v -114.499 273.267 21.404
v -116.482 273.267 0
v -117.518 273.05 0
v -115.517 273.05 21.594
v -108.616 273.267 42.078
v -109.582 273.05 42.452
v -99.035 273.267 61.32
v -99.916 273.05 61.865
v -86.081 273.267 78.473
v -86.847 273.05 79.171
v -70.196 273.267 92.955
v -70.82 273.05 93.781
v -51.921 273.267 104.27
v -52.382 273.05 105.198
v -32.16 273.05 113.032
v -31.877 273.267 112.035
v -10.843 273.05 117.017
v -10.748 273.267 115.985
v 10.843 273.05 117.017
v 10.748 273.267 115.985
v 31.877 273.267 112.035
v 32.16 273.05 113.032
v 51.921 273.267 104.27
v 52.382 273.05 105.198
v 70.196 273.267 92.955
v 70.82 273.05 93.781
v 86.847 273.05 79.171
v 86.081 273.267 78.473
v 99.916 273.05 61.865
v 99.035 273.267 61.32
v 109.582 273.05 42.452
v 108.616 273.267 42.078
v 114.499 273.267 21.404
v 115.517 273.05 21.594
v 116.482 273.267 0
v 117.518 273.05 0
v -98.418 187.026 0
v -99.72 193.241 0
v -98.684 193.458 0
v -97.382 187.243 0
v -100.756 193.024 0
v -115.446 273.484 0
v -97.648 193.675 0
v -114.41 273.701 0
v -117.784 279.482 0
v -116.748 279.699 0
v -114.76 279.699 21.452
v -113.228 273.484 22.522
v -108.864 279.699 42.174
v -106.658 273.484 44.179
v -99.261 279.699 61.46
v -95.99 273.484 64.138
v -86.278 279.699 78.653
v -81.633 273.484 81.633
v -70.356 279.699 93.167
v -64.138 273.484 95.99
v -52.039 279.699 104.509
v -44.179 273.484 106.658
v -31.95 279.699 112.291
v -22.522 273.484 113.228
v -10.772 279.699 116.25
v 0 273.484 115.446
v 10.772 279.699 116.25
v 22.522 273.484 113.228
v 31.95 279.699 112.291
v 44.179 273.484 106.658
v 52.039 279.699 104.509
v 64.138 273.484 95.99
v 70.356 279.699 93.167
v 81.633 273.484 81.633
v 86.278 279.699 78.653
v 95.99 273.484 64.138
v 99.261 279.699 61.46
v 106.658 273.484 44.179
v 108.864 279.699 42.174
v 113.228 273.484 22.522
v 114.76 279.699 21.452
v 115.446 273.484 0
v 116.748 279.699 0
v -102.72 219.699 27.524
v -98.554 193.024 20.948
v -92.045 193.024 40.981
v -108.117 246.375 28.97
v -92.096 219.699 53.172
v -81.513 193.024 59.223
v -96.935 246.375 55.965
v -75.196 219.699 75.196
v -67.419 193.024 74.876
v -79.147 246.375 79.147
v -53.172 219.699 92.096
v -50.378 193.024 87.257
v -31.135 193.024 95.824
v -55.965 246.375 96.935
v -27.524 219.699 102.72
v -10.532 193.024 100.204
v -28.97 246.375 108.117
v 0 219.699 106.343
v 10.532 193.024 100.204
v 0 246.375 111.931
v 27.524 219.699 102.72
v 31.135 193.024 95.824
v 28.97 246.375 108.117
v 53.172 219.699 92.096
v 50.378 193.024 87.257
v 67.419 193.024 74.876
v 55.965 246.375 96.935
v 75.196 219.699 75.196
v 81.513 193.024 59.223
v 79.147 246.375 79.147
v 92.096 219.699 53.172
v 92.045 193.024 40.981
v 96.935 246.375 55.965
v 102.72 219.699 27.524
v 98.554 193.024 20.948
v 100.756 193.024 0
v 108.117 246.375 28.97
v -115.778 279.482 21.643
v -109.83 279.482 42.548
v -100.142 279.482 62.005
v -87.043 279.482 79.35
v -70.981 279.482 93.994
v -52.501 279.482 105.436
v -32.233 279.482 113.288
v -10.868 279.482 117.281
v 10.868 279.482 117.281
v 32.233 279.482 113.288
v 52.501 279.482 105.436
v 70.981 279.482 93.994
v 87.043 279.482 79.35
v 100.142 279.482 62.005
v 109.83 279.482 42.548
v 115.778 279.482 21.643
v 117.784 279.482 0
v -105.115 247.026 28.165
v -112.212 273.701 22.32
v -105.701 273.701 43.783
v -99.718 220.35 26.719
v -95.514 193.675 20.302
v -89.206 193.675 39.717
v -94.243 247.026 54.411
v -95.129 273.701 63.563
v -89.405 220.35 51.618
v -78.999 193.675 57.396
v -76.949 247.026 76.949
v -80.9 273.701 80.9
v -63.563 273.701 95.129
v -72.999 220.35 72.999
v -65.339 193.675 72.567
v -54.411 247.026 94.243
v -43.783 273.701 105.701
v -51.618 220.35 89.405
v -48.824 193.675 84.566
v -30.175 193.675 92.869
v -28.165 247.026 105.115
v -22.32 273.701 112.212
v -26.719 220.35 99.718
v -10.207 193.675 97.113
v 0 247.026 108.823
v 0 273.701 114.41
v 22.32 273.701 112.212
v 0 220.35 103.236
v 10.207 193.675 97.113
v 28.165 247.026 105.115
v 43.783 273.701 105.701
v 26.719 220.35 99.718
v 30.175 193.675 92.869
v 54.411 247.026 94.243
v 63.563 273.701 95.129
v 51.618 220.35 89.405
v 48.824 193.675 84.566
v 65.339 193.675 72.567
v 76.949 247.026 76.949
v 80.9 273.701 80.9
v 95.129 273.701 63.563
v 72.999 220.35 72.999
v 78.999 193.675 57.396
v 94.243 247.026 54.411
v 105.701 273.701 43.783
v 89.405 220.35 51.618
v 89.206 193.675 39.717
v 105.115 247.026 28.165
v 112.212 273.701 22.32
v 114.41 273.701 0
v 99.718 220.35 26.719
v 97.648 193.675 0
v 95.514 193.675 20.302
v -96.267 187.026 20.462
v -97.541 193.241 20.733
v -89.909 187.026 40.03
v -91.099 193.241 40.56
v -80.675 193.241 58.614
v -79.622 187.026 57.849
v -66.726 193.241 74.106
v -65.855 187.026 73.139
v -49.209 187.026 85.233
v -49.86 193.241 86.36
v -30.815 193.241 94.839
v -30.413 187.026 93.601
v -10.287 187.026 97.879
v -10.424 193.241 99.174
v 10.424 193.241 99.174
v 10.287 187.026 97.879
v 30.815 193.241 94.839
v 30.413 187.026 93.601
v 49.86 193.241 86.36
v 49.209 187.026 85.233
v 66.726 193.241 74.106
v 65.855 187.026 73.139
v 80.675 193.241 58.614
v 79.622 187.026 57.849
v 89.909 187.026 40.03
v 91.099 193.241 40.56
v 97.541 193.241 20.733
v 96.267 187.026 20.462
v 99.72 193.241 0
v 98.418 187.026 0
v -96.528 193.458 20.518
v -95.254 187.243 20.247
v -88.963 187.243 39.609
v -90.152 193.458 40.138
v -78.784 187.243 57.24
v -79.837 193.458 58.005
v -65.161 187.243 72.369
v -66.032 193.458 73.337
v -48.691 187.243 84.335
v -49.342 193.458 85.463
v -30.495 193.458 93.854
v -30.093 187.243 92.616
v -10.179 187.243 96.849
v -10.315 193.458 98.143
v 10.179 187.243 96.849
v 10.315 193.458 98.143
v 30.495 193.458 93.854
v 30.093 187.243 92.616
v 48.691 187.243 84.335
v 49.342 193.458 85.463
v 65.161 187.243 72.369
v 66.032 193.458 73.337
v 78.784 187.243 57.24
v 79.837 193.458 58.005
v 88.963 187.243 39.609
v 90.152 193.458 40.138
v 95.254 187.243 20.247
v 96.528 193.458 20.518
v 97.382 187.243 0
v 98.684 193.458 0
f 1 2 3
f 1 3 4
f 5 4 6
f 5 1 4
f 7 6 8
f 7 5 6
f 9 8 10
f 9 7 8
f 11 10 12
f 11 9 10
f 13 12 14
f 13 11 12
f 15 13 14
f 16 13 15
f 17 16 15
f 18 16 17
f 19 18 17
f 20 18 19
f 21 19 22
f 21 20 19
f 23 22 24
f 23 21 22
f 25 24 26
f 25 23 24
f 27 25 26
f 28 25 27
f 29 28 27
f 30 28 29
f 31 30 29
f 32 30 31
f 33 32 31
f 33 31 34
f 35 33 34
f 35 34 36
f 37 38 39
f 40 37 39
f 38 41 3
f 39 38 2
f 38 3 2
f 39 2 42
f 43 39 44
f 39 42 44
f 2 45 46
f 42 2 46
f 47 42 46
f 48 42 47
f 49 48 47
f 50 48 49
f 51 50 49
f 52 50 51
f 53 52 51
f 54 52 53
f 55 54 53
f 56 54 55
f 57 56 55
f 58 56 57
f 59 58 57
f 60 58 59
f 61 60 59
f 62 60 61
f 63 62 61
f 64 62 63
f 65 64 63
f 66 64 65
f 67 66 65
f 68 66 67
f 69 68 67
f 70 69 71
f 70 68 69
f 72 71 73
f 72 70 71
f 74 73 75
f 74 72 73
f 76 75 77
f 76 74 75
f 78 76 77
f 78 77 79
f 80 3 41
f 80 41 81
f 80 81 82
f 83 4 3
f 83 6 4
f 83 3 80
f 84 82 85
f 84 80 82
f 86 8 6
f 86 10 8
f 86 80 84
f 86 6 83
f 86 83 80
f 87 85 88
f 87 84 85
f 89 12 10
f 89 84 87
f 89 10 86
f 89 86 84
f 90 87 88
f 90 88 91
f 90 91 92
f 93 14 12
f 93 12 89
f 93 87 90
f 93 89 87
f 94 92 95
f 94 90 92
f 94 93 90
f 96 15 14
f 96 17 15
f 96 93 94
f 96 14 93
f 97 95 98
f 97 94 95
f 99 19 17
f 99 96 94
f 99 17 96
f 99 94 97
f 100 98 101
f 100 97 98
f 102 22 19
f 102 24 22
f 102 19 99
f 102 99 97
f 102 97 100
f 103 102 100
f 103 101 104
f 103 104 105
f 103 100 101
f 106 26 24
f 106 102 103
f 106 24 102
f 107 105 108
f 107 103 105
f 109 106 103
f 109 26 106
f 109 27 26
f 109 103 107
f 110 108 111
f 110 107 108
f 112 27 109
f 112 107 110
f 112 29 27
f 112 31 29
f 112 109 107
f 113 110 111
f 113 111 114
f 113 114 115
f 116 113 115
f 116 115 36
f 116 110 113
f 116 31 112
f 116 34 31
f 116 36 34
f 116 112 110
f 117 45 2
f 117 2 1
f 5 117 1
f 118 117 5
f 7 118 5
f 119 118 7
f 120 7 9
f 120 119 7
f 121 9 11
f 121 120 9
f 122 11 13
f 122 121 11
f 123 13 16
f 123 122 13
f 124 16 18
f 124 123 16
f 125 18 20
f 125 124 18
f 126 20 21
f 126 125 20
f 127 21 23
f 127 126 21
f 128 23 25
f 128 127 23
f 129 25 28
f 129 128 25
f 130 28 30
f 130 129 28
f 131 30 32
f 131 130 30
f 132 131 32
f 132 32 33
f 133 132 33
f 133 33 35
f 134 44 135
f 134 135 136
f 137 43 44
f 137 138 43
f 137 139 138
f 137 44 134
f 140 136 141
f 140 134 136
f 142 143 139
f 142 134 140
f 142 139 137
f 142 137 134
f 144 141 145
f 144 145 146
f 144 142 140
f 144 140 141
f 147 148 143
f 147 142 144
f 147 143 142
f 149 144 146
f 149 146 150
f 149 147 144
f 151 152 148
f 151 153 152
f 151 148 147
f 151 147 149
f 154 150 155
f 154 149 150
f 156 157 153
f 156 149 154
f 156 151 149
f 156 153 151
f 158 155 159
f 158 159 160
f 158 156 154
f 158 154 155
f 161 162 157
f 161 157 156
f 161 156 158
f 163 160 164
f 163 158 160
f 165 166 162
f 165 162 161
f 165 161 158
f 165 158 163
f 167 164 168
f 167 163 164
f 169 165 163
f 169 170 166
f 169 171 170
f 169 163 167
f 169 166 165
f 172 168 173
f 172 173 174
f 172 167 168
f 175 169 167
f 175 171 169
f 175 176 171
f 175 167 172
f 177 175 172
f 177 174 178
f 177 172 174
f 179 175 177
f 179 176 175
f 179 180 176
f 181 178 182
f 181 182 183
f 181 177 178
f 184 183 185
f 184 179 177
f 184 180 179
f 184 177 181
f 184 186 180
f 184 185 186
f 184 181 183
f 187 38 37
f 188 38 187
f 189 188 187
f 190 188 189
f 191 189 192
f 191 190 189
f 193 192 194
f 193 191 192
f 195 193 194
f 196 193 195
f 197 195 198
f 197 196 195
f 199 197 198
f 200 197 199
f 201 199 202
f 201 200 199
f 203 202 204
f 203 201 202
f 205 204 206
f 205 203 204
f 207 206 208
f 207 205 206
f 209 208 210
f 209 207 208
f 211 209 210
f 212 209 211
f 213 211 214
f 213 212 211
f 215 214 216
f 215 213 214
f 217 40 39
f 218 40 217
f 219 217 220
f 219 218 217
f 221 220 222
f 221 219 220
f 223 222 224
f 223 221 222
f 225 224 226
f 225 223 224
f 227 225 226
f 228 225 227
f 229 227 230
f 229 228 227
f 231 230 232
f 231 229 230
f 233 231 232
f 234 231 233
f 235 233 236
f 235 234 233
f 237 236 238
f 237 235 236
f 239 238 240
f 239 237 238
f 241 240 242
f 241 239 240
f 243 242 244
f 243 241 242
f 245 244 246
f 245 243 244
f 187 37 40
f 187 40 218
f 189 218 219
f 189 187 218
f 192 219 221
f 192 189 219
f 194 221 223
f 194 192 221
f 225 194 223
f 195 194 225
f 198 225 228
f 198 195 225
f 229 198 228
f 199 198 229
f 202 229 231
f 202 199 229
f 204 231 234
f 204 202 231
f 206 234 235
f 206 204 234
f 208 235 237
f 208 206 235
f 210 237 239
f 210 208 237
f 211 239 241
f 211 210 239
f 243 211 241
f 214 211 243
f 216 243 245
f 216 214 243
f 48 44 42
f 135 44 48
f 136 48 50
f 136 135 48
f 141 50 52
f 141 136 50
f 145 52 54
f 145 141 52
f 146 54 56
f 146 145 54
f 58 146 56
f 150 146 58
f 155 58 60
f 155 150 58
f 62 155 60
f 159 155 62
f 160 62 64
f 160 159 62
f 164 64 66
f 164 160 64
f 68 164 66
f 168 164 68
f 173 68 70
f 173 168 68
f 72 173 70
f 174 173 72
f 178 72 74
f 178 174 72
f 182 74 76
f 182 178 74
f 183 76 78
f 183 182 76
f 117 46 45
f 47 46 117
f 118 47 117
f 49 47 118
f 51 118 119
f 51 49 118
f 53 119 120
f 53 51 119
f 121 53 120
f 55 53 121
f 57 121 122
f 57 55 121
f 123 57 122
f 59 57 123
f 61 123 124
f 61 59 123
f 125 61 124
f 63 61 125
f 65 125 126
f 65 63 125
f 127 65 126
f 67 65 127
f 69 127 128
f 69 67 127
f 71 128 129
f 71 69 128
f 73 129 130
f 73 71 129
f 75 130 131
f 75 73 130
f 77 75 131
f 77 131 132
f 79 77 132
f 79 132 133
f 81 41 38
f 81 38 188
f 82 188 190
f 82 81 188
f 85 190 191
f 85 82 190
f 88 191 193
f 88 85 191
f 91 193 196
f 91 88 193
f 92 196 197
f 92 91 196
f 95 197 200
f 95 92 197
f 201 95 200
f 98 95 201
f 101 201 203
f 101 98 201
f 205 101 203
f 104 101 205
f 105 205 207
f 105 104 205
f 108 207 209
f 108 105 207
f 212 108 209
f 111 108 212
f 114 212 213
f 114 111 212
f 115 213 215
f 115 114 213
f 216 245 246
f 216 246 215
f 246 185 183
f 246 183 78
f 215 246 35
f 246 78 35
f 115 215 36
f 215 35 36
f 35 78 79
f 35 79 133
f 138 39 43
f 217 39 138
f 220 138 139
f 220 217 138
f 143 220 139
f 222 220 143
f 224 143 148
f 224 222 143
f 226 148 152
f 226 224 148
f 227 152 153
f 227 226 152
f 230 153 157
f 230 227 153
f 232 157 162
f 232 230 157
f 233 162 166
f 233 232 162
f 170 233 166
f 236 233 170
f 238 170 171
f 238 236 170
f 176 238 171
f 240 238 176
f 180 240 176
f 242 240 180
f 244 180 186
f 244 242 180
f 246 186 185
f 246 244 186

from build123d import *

# Parameters (mm, degrees)
RIB5_START          = -1.5875
RIB5_DEPTH          = 3.175
CIRPATTERN1_COUNT   = 4
BOSS_EXTRUDE1_REACH = 604.818
SKETCH4_R           = 50.8
SKETCH4_R_2         = 44.45
SKETCH4_3_R         = 44.45
CUT_EXTRUDE1_DEPTH  = 155.575
SKETCH16_R          = 47.625
SKETCH16_R_2        = 44.45
CUT_EXTRUDE8_DEPTH  = 165.1
BOSS_EXTRUDE2_START = 127
SKETCH10_R          = 53.975
SKETCH10_R_2        = 50.8
BOSS_EXTRUDE2_DEPTH = 127
RIB10_START         = -3.175
RIB10_DEPTH         = 3.175
SKETCH12_R          = 50.8
CUT_EXTRUDE4_DEPTH  = 9.525
SKETCH17_R          = 3.175
CUT_EXTRUDE9_DEPTH  = 3.175
SKETCH18_W          = 50.8
SKETCH18_H          = 130.175
SKETCH19_W          = 254
SKETCH19_H          = 114.3
CUT_EXTRUDE10_DEPTH = 326.542078986


with BuildPart() as part:
    # Sketch1 → Revolve-Thin1 (revolve)
    with BuildSketch(Plane.XY, mode=Mode.PRIVATE) as revolve_thin1_sk:
        Polygon((-104.775, 0), (-60.325, 0), (-158.75, 469.9), (-50.8, 469.9), (-50.8, 466.725), (-154.841065026, 466.725), (-56.416065026, -3.175), (-104.775, -3.175), align=None)
    revolve(revolve_thin1_sk.sketch.rotate(Axis((0, 0, 0), (0, 1, 0)), 270), axis=Axis((0, 0, 0), (0, 1, 0)))

    # Rib5: read off the stored shape, not the designer's step
    # Rib5 outline → Rib5 (add)
    with BuildSketch(Plane(origin=(0, 0, 0), x_dir=(0, 0, -1), z_dir=(1, 0, 0)).offset(RIB5_START)):
        with BuildLine():
            add(Edge.make_bspline(
                [(-60.304108235, -2e-09), (-60.337817831, 0.160880416), (-60.371527408, 0.321760839), (-62.968360223, 12.715265359), (-65.531376886, 24.947911788), (-71.07360722, 51.400397829), (-74.052795216, 65.620242821), (-77.031911205, 79.840102899)],
                knots=[1388.368707512, 1388.368707512, 1388.368707512, 1388.368707512, 1388.861829823, 1388.861829823, 1426.356632629, 1426.356632629, 1469.942363945, 1469.942363945, 1469.942363945, 1469.942363945], degree=3))
            Line((-77.031911205, 79.840102899), (-98.425, 0))
            Line((-98.425, 0), (-60.304108235, -2e-09))
        make_face()
    rib5 = extrude(amount=RIB5_DEPTH)

    # CirPattern1: Rib5 ×4 about axis
    cirpattern1_axis = Axis((0, 0, 0), (0, 1, 0))
    for i in range(1, CIRPATTERN1_COUNT):
        add(rib5.rotate(cirpattern1_axis, i * 360 / CIRPATTERN1_COUNT))

    # Sketch4 → Boss-Extrude1 (add, up to next)
    with BuildSketch(Plane(origin=(0, 41.317067623, 234.320734449), x_dir=(-1, 0, 0), z_dir=(0, 0.17364817766693072, 0.984807753012208)), mode=Mode.PRIVATE) as boss_extrude1_sk1:
        with Locations(Location((-89.350924276, -380.21116314, 0), (0, 0, 90))):
            Circle(SKETCH4_R)
        with Locations(Location((-89.350924276, -380.21116314, 0), (0, 0, 90))):
            Circle(SKETCH4_R_2, mode=Mode.SUBTRACT)
    boss_extrude1_tool1 = extrude(boss_extrude1_sk1.sketch, amount=-BOSS_EXTRUDE1_REACH, mode=Mode.PRIVATE) - part.part
    add(boss_extrude1_tool1.solids().sort_by_distance((89.350924, 464.365191, 159.725936))[0])

    # Sketch4<3> → Cut-Extrude1 (cut)
    with BuildSketch(Plane(origin=(0, 41.317067623, 234.320734449), x_dir=(-1, 0, 0), z_dir=(0, 0.17364817766693072, 0.984807753012208))):
        with Locations(Location((-89.350924276, -380.21116314, 0), (0, 0, 90))):
            Circle(SKETCH4_3_R)
    extrude(amount=-CUT_EXTRUDE1_DEPTH, mode=Mode.SUBTRACT)

    # Sketch16 → Cut-Extrude8 (cut)
    # profile 1 of 2: a face of its own
    with BuildSketch(Plane(origin=(0, 41.317067623, 234.320734449), x_dir=(1, 0, 0), z_dir=(0, 0.17364817766693058, 0.9848077530122081))):
        with Locations(Location((89.350924276, 380.21116314, 0), (0, 0, 270))):
            Circle(SKETCH16_R)
        with Locations((89.350924276, 380.21116314)):
            Circle(SKETCH16_R_2, mode=Mode.SUBTRACT)
    # profile 2 of 2: a face of its own
    with BuildSketch(Plane(origin=(0, 41.317067623, 234.320734449), x_dir=(1, 0, 0), z_dir=(0, 0.17364817766693058, 0.9848077530122081))):
        with Locations((89.350924276, 380.21116314)):
            Circle(SKETCH16_R_2)
    extrude(amount=-CUT_EXTRUDE8_DEPTH, mode=Mode.SUBTRACT)

    # Sketch10 → Boss-Extrude2 (add)
    with BuildSketch(Plane.XZ.offset(-466.725).offset(BOSS_EXTRUDE2_START)):
        with Locations(Location((0, 0, 0), (0, 0, 90))):
            Circle(SKETCH10_R)
        with Locations(Location((0, 0, 0), (0, 0, 270))):
            Circle(SKETCH10_R_2, mode=Mode.SUBTRACT)
    extrude(amount=-BOSS_EXTRUDE2_DEPTH)

    # Rib10: read off the stored shape, not the designer's step
    # Rib10 outline → Rib10 (add)
    with BuildSketch(Plane(origin=(41.275, 0, 0), x_dir=(0, 0, -1), z_dir=(1, 0, 0)).offset(RIB10_START)):
        with BuildLine():
            Line((-129.397511049, 371.475000111), (-34.780382402, 371.475))
            Line((-34.780382402, 371.475), (-34.780382402, 466.725))
            Line((-34.780382402, 466.725), (-150.08046179, 466.725000293))
            add(Edge.make_bspline(
                [(-129.397511049, 371.475000111), (-129.621022333, 372.498635621), (-129.844489601, 373.522280745), (-132.947477272, 387.73914033), (-135.819852259, 400.933914587), (-140.797597402, 423.849651078), (-142.905681683, 433.570024076), (-146.702544816, 451.101957641), (-148.392325081, 458.913301347), (-150.08046179, 466.725000293)],
                knots=[195.059408085, 195.059408085, 195.059408085, 195.059408085, 198.202667885, 198.202667885, 238.714059285, 238.714059285, 268.553076365, 268.553076365, 292.529147638, 292.529147638, 292.529147638, 292.529147638], degree=3))
        make_face()
    extrude(amount=RIB10_DEPTH)

    # Sketch12 → Cut-Extrude4 (cut)
    with BuildSketch(Plane(origin=(0, 41.317067623, 234.320734449), x_dir=(1, 0, 0), z_dir=(0, 0.17364817766693058, 0.9848077530122081))):
        with Locations(Location((89.350924276, 380.21116314, 0), (0, 0, 270))):
            Circle(SKETCH12_R)
    extrude(amount=-CUT_EXTRUDE4_DEPTH, mode=Mode.SUBTRACT)

    # Sketch17 → Cut-Extrude9 (cut)
    with BuildSketch(Plane.XZ.offset(3.175)):
        with Locations(Location((-62.861792847, 62.861792847, 0), (0, 0, 270))):
            Circle(SKETCH17_R)
        with Locations(Location((-34.020557137, 82.13289044, 0), (0, 0, 270))):
            Circle(SKETCH17_R)
        with Locations(Location((34.020557137, 82.13289044, 0), (0, 0, 270))):
            Circle(SKETCH17_R)
        with Locations(Location((62.861792847, 62.861792847, 0), (0, 0, 270))):
            Circle(SKETCH17_R)
        with Locations(Location((82.13289044, 34.020557137, 0), (0, 0, 270))):
            Circle(SKETCH17_R)
        with Locations(Location((82.13289044, -34.020557137, 0), (0, 0, 270))):
            Circle(SKETCH17_R)
        with Locations(Location((62.861792847, -62.861792847, 0), (0, 0, 270))):
            Circle(SKETCH17_R)
        with Locations(Location((34.020557137, -82.13289044, 0), (0, 0, 270))):
            Circle(SKETCH17_R)
        with Locations(Location((-34.020557137, -82.13289044, 0), (0, 0, 270))):
            Circle(SKETCH17_R)
        with Locations(Location((-62.861792847, -62.861792847, 0), (0, 0, 270))):
            Circle(SKETCH17_R)
        with Locations(Location((-82.13289044, -34.020557137, 0), (0, 0, 270))):
            Circle(SKETCH17_R)
        with Locations(Location((-82.13289044, 34.020557137, 0), (0, 0, 270))):
            Circle(SKETCH17_R)
    extrude(amount=-CUT_EXTRUDE9_DEPTH, mode=Mode.SUBTRACT)

    # Sketch18 → Cut-Revolve2 (revolve, cut)
    with BuildSketch(Plane.XY, mode=Mode.PRIVATE) as cut_revolve2_sk:
        Polygon((-114.410343119, 273.700908317), (-154.841065026, 466.725), (-56.416065026, 339.725), (-53.975, 339.725), (-50.8, 339.725), (-50.8, 469.9), (-158.75, 469.9), (-117.517905405, 273.05), (-116.48205131, 273.266969439), (-117.783867943, 279.482094012), (-116.748013848, 279.69906345), (-115.446197215, 273.483938878), align=None)
        Polygon((-56.416065026, -3.175), (-97.64815962, 193.675), (-98.684013716, 193.458030561), (-97.382197082, 187.242905988), (-98.418051178, 187.02593655), (-99.719867811, 193.241061122), (-100.755721907, 193.024091683), (-77.041088772, 79.805843168), (-98.425, 0), (-104.775, 0), (-104.775, -3.175), align=None)
        with Locations((-25.4, 404.8125)):
            Rectangle(SKETCH18_W, SKETCH18_H)
    revolve(cut_revolve2_sk.sketch.rotate(Axis((0, 0, 0), (0, 1, 0)), 270), axis=Axis((0, 0, 0), (0, 1, 0)), mode=Mode.SUBTRACT)


with BuildPart() as cut_revolve2_kept_piece:
    # of the separate pieces the step leaves, the one the design keeps (cut_revolve2_pieces_kept)
    add(part.part.solids().sort_by_distance((0, 193.024091683, -100.755721907))[0])

    # Sketch19 → Cut-Extrude10 (cut, through all)
    with BuildSketch(Plane.XY):
        with Locations((0, 233.254015281)):
            Rectangle(SKETCH19_W, SKETCH19_H)
    extrude(amount=-CUT_EXTRUDE10_DEPTH, mode=Mode.SUBTRACT)


solid = cut_revolve2_kept_piece.part
